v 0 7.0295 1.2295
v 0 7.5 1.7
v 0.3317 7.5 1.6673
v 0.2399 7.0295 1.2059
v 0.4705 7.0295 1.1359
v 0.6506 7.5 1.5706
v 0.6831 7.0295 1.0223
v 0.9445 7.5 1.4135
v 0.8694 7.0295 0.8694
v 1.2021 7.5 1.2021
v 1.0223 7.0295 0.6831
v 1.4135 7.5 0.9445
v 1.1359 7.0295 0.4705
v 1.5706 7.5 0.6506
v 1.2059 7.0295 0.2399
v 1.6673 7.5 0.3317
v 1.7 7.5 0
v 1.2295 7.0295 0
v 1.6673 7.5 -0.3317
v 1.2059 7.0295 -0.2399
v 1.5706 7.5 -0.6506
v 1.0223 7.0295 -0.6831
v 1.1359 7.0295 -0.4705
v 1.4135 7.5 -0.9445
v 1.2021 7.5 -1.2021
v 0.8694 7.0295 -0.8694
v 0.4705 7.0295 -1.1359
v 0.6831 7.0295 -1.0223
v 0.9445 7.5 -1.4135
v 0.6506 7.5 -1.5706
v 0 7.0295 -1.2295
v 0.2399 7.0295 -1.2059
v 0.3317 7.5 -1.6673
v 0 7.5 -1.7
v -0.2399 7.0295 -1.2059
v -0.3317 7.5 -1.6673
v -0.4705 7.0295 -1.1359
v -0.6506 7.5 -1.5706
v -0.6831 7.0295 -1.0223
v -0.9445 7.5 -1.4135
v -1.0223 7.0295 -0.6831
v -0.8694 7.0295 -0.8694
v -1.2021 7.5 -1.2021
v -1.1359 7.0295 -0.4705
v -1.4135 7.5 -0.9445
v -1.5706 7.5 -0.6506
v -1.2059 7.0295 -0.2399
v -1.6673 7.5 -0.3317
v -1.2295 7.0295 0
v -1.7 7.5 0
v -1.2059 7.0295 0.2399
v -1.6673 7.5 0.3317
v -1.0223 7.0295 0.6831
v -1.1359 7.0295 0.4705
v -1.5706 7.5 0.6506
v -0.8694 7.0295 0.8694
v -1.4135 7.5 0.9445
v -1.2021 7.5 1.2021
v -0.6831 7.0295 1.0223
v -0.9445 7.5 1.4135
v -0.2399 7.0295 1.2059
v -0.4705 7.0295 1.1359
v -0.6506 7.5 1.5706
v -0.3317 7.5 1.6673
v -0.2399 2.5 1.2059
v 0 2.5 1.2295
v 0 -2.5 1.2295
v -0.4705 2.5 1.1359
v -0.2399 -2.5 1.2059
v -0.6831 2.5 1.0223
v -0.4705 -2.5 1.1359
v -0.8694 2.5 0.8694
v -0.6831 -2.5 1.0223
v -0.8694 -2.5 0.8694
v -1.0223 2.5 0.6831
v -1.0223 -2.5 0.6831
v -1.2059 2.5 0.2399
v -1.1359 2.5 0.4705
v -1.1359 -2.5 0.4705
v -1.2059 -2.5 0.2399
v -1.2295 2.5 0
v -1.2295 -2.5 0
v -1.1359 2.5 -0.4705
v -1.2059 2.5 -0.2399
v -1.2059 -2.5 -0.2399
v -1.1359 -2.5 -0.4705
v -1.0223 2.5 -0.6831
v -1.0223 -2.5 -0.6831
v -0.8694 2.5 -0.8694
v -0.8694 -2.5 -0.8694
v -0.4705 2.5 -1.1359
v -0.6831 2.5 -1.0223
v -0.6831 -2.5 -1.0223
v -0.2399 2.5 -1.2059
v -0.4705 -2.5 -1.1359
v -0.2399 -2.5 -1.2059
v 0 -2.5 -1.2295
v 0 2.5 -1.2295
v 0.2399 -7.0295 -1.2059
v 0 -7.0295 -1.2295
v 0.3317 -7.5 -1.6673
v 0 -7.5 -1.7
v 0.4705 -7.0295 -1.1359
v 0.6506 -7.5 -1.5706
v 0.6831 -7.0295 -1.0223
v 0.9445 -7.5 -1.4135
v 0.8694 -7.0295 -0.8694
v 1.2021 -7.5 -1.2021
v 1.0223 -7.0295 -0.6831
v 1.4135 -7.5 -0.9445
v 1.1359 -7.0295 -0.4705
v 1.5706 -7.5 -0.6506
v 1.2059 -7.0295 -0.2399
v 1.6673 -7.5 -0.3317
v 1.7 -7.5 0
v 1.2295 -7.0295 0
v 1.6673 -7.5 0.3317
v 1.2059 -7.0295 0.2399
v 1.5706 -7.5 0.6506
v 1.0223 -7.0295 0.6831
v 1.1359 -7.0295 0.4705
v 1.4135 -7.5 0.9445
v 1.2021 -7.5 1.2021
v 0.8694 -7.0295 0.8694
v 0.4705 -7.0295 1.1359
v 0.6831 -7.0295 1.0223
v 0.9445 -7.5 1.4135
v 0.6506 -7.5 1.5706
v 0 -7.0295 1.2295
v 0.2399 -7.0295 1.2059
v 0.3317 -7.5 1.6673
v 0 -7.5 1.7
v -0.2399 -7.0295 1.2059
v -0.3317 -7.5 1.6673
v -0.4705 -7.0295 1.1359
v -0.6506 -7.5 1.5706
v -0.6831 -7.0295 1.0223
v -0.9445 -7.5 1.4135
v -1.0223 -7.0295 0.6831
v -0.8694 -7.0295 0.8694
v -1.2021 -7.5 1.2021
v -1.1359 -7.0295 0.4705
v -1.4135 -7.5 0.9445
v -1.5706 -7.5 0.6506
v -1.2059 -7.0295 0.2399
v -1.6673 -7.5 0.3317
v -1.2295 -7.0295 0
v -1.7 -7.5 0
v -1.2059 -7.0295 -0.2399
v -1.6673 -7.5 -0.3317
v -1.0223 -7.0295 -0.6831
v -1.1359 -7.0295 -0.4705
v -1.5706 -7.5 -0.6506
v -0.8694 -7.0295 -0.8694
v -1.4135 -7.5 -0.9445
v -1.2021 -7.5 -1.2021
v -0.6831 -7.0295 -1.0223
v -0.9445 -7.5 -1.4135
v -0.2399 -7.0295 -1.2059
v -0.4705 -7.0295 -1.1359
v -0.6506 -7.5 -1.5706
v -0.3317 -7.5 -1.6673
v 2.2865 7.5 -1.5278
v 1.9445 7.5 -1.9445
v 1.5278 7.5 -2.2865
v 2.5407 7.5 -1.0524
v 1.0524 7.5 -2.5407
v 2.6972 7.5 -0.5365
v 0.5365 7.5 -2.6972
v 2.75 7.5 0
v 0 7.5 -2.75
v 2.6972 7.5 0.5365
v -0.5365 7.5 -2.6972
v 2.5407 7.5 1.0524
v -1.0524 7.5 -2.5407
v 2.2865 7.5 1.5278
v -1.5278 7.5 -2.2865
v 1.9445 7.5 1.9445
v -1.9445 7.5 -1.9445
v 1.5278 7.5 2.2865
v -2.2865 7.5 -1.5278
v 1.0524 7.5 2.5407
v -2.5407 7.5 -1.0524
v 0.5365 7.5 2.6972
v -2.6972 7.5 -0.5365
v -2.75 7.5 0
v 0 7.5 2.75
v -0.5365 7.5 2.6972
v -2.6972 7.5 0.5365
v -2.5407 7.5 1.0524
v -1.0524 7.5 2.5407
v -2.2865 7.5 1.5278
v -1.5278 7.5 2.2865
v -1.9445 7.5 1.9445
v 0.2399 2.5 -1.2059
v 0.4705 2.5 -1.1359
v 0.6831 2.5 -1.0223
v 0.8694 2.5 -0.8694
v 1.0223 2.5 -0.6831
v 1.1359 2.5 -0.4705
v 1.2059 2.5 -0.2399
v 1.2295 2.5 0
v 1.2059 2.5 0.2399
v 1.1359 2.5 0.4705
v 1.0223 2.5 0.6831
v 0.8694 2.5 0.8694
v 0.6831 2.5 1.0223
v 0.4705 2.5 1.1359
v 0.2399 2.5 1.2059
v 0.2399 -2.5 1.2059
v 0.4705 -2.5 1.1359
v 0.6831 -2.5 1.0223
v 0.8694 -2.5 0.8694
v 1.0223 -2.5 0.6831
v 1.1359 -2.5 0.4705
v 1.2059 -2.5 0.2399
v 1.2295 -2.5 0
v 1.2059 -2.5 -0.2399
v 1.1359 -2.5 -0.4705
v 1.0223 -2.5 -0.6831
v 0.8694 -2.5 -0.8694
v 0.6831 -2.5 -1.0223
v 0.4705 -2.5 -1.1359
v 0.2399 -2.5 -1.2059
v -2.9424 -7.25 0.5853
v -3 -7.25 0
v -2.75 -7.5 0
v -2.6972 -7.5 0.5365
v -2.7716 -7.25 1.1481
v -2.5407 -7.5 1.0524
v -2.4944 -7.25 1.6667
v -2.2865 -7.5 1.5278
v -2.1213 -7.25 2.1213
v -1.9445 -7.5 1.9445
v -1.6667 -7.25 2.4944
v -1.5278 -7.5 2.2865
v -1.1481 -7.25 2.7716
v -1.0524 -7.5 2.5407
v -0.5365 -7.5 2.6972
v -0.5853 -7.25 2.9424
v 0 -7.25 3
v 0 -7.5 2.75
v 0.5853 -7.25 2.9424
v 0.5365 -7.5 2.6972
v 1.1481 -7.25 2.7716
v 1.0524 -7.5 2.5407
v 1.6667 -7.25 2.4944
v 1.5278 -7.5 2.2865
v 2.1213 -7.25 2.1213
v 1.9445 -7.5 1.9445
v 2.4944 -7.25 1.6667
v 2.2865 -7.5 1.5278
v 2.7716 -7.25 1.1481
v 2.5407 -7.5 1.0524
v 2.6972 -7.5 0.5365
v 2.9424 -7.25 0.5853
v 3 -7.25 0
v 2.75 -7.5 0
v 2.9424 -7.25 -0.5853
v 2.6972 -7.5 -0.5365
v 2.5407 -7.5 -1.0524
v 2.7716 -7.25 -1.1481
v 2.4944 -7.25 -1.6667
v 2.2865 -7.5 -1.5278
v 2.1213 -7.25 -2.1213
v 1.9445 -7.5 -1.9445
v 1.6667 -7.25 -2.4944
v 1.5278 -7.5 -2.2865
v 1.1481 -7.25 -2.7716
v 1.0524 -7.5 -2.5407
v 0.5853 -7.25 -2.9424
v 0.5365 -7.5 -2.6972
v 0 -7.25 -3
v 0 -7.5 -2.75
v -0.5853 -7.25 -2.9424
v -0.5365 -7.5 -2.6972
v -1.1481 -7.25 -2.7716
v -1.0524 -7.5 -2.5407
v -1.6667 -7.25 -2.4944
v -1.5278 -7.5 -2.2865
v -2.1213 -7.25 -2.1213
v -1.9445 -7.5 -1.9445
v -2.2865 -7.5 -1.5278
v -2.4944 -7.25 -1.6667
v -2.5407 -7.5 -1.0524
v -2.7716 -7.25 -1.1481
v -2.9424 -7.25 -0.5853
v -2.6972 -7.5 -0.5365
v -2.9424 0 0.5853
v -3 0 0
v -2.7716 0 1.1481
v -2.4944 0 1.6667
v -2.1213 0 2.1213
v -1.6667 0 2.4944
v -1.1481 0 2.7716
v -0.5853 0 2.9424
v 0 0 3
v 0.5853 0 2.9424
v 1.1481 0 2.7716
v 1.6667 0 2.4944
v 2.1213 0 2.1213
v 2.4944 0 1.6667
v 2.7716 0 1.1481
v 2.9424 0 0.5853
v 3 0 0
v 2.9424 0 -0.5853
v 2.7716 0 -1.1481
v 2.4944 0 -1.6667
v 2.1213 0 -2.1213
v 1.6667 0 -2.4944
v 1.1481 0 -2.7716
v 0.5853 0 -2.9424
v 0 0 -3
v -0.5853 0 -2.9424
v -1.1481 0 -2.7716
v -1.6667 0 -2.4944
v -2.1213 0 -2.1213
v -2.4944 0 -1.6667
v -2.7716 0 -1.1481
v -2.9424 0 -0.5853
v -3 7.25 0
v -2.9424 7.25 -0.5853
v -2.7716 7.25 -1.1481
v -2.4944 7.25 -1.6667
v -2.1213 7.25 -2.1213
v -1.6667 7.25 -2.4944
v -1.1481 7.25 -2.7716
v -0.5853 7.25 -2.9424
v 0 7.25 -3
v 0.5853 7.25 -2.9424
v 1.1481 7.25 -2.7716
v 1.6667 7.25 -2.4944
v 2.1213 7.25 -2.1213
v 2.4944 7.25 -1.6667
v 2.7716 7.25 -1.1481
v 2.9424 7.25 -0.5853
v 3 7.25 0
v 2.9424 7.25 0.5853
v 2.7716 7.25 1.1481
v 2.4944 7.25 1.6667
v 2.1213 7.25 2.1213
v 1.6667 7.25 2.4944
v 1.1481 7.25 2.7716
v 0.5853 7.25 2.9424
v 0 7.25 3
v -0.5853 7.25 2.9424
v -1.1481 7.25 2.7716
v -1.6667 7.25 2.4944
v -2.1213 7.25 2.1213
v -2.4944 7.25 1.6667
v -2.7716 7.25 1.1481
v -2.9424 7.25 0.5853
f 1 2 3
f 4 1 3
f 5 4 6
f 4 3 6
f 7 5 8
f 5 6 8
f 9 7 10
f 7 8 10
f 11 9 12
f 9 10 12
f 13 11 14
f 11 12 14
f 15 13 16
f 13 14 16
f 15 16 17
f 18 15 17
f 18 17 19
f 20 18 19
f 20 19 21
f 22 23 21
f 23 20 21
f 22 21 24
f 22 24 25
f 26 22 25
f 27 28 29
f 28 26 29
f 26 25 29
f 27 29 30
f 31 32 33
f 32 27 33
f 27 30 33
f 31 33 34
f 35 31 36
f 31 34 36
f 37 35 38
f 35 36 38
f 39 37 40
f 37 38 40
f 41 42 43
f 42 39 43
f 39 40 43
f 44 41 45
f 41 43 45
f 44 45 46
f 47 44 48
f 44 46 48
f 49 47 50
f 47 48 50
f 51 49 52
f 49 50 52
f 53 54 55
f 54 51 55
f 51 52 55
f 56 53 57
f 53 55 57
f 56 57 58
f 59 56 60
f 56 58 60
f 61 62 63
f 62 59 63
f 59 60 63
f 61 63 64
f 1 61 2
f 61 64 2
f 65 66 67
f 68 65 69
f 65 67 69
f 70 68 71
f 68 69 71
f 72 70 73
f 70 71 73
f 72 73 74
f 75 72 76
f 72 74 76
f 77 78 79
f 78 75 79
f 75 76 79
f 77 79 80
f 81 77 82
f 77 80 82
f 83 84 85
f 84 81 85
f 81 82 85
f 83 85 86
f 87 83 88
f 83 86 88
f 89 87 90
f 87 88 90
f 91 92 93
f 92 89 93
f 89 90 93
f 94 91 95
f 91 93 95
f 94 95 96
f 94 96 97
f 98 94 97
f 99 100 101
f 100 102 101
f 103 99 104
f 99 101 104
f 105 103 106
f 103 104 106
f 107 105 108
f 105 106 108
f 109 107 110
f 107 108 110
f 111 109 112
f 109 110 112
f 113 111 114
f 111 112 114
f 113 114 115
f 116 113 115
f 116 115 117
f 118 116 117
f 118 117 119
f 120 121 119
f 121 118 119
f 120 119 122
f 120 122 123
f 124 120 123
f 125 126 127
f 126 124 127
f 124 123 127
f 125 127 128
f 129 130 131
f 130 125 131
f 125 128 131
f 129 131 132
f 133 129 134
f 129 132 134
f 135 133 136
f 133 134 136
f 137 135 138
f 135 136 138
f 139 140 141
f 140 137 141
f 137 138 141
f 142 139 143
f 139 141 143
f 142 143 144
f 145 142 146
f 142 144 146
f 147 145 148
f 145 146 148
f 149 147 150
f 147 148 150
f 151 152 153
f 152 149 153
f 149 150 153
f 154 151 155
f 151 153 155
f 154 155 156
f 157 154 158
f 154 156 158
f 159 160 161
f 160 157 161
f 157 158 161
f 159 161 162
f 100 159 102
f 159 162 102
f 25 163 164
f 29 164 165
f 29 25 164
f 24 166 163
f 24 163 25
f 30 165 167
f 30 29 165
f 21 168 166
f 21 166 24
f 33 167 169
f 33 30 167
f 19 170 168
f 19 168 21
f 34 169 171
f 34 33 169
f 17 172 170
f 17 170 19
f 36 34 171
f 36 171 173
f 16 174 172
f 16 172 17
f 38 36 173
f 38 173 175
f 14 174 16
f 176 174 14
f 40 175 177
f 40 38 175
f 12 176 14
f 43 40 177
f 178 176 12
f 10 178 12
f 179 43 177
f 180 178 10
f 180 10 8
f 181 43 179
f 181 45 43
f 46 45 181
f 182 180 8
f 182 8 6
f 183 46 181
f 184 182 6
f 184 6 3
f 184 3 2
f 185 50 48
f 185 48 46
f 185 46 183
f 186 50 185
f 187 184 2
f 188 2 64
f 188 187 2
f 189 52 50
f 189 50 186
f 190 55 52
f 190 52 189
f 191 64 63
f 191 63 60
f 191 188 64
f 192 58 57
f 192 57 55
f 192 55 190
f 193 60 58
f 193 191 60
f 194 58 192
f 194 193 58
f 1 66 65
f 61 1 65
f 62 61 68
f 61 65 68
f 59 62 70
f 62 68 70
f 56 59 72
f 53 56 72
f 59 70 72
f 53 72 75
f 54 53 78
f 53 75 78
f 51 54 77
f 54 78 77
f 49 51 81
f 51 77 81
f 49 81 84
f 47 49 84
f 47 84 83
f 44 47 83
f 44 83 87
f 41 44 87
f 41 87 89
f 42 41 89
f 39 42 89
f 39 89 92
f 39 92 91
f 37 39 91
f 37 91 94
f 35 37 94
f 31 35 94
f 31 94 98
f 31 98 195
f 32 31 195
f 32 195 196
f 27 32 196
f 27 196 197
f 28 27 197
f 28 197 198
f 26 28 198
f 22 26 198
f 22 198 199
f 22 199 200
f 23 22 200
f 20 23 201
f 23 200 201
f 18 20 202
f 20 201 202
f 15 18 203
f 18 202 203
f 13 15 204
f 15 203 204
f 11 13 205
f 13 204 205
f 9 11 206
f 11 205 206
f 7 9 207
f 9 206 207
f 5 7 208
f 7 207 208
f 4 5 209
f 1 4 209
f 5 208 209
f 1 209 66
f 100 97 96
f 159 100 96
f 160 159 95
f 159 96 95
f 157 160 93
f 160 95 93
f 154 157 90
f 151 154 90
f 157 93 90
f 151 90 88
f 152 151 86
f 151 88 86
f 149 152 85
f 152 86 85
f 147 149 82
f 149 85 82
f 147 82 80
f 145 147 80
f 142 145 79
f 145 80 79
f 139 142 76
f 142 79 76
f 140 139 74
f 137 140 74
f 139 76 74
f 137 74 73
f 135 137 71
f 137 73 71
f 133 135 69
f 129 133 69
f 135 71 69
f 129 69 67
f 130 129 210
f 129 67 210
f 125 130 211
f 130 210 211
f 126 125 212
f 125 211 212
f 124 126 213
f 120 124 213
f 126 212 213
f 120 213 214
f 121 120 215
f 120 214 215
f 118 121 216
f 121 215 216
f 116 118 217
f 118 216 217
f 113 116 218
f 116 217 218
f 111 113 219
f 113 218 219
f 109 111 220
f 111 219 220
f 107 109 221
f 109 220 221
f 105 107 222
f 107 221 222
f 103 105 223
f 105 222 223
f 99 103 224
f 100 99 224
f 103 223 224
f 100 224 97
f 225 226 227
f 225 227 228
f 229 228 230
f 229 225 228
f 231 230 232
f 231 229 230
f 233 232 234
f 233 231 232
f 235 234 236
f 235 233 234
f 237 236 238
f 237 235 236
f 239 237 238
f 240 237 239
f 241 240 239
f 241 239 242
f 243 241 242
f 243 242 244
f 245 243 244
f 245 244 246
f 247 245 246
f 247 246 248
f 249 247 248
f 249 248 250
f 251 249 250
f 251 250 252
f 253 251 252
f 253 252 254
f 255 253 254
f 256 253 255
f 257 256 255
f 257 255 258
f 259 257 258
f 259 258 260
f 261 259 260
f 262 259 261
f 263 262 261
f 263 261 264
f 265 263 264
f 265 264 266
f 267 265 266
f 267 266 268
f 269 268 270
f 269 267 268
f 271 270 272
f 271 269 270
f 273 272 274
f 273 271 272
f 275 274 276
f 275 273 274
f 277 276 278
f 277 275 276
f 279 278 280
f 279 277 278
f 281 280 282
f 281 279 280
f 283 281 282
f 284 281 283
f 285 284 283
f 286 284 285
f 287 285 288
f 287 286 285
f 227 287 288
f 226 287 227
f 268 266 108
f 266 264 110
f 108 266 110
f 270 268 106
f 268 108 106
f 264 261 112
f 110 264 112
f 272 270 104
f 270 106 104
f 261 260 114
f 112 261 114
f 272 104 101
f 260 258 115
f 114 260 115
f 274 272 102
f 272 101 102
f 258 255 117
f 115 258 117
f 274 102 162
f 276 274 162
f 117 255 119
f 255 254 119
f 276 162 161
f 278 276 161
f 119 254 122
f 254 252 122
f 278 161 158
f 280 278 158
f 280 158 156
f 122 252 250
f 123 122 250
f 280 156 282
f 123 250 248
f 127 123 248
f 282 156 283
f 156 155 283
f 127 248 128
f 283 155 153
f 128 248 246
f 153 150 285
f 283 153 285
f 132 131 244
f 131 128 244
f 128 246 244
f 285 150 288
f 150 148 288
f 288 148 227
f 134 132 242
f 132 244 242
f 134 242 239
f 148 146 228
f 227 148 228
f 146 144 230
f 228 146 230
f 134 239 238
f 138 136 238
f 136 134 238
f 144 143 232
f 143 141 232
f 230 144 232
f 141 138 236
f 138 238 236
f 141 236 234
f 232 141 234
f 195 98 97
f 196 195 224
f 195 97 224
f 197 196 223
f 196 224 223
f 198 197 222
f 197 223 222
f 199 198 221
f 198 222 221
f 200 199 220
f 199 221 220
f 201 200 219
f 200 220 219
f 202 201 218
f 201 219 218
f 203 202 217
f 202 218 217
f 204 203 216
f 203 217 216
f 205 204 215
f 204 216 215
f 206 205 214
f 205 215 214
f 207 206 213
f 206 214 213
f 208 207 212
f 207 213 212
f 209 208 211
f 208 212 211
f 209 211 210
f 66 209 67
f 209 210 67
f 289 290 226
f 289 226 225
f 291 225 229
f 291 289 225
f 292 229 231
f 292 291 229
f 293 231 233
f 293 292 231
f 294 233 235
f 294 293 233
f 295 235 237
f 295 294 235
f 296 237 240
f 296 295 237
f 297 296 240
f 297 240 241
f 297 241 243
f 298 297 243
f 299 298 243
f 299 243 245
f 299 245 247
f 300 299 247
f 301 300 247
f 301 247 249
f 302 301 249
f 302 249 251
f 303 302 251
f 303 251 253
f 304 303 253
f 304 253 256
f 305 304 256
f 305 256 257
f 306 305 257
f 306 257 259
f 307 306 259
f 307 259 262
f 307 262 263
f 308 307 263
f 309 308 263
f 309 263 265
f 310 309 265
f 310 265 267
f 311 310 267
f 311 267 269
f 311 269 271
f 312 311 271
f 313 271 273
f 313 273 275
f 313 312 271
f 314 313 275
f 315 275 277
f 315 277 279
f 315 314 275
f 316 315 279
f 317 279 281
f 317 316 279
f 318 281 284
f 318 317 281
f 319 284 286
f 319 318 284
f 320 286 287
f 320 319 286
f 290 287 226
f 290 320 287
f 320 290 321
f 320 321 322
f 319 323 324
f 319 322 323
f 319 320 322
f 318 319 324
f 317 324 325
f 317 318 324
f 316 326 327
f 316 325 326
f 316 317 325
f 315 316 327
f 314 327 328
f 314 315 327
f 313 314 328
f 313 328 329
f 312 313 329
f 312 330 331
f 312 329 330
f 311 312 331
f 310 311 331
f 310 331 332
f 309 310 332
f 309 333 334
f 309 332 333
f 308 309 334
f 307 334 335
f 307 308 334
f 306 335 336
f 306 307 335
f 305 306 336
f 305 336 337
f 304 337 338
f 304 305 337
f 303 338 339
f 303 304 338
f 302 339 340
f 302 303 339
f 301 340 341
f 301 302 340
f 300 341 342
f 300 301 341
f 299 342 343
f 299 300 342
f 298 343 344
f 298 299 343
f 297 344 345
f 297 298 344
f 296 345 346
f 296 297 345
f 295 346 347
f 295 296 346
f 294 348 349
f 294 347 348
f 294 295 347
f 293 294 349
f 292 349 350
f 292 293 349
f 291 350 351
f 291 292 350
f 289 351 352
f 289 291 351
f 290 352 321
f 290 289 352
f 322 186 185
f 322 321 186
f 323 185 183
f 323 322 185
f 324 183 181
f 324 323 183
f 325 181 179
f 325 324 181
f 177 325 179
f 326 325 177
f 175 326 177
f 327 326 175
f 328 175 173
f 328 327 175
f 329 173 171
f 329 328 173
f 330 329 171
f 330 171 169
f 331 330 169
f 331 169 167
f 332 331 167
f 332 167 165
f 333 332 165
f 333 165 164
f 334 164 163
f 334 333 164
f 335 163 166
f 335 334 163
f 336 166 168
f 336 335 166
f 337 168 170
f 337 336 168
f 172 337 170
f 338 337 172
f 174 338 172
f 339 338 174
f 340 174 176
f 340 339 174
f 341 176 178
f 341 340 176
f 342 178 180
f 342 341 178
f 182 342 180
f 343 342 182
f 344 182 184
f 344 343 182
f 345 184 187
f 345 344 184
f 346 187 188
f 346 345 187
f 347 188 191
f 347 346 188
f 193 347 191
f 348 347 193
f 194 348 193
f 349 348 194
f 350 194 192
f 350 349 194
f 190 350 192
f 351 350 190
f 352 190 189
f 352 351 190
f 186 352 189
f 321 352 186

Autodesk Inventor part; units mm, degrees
ref_plane "YZ Plane" through (0, 0, 0) normal (1, 0, 0) x (0, 1, 0)
ref_plane "XZ Plane" through (0, 0, 0) normal (0, 1, 0) x (-1, 0, 0)
ref_plane "XY Plane" through (0, 0, 0) normal (0, 0, 1) x (1, 0, 0)
sketch "スケッチ1" plane through (0, 0, 0) normal (0, 1, 0) x (-1, 0, 0)
  circle A0 centre (0, 0) radius 3
  dimension "d0" = 6
extrude "押し出し1" add sketch "スケッチ1" along normal mid plane 15
sketch "スケッチ2" plane through (0, 7.5, 0) normal (0, 1, 0) x (1, 0, 0)
  point P0 (0, 0)
  point P1 (0, 0)
hole "穴1" at (0, 7.5, 0) direction (0, -1, 0) diameter 2.459 depth 10 countersink diameter 3.4 countersink angle 90 thread size "M3x0.5" class "6H" standard "ISO Metric profile"
sketch "スケッチ3" plane through (0, -7.5, 0) normal (0, -1, 0) x (1, 0, 0)
  point P0 (0, 0)
  point P1 (0, 0)
hole "穴2" at (0, -7.5, 0) direction (0, 1, 0) diameter 2.459 depth 10 countersink diameter 3.4 countersink angle 90 thread size "M3x0.5" class "6H" standard "ISO Metric profile"
chamfer "面取り1" distance 0.25 angle 45 2 edges at (3, -7.5, 0) (3, 7.5, 0)
properties part number "Spacer_M3D6L60" material "アルミニウム 6061"
